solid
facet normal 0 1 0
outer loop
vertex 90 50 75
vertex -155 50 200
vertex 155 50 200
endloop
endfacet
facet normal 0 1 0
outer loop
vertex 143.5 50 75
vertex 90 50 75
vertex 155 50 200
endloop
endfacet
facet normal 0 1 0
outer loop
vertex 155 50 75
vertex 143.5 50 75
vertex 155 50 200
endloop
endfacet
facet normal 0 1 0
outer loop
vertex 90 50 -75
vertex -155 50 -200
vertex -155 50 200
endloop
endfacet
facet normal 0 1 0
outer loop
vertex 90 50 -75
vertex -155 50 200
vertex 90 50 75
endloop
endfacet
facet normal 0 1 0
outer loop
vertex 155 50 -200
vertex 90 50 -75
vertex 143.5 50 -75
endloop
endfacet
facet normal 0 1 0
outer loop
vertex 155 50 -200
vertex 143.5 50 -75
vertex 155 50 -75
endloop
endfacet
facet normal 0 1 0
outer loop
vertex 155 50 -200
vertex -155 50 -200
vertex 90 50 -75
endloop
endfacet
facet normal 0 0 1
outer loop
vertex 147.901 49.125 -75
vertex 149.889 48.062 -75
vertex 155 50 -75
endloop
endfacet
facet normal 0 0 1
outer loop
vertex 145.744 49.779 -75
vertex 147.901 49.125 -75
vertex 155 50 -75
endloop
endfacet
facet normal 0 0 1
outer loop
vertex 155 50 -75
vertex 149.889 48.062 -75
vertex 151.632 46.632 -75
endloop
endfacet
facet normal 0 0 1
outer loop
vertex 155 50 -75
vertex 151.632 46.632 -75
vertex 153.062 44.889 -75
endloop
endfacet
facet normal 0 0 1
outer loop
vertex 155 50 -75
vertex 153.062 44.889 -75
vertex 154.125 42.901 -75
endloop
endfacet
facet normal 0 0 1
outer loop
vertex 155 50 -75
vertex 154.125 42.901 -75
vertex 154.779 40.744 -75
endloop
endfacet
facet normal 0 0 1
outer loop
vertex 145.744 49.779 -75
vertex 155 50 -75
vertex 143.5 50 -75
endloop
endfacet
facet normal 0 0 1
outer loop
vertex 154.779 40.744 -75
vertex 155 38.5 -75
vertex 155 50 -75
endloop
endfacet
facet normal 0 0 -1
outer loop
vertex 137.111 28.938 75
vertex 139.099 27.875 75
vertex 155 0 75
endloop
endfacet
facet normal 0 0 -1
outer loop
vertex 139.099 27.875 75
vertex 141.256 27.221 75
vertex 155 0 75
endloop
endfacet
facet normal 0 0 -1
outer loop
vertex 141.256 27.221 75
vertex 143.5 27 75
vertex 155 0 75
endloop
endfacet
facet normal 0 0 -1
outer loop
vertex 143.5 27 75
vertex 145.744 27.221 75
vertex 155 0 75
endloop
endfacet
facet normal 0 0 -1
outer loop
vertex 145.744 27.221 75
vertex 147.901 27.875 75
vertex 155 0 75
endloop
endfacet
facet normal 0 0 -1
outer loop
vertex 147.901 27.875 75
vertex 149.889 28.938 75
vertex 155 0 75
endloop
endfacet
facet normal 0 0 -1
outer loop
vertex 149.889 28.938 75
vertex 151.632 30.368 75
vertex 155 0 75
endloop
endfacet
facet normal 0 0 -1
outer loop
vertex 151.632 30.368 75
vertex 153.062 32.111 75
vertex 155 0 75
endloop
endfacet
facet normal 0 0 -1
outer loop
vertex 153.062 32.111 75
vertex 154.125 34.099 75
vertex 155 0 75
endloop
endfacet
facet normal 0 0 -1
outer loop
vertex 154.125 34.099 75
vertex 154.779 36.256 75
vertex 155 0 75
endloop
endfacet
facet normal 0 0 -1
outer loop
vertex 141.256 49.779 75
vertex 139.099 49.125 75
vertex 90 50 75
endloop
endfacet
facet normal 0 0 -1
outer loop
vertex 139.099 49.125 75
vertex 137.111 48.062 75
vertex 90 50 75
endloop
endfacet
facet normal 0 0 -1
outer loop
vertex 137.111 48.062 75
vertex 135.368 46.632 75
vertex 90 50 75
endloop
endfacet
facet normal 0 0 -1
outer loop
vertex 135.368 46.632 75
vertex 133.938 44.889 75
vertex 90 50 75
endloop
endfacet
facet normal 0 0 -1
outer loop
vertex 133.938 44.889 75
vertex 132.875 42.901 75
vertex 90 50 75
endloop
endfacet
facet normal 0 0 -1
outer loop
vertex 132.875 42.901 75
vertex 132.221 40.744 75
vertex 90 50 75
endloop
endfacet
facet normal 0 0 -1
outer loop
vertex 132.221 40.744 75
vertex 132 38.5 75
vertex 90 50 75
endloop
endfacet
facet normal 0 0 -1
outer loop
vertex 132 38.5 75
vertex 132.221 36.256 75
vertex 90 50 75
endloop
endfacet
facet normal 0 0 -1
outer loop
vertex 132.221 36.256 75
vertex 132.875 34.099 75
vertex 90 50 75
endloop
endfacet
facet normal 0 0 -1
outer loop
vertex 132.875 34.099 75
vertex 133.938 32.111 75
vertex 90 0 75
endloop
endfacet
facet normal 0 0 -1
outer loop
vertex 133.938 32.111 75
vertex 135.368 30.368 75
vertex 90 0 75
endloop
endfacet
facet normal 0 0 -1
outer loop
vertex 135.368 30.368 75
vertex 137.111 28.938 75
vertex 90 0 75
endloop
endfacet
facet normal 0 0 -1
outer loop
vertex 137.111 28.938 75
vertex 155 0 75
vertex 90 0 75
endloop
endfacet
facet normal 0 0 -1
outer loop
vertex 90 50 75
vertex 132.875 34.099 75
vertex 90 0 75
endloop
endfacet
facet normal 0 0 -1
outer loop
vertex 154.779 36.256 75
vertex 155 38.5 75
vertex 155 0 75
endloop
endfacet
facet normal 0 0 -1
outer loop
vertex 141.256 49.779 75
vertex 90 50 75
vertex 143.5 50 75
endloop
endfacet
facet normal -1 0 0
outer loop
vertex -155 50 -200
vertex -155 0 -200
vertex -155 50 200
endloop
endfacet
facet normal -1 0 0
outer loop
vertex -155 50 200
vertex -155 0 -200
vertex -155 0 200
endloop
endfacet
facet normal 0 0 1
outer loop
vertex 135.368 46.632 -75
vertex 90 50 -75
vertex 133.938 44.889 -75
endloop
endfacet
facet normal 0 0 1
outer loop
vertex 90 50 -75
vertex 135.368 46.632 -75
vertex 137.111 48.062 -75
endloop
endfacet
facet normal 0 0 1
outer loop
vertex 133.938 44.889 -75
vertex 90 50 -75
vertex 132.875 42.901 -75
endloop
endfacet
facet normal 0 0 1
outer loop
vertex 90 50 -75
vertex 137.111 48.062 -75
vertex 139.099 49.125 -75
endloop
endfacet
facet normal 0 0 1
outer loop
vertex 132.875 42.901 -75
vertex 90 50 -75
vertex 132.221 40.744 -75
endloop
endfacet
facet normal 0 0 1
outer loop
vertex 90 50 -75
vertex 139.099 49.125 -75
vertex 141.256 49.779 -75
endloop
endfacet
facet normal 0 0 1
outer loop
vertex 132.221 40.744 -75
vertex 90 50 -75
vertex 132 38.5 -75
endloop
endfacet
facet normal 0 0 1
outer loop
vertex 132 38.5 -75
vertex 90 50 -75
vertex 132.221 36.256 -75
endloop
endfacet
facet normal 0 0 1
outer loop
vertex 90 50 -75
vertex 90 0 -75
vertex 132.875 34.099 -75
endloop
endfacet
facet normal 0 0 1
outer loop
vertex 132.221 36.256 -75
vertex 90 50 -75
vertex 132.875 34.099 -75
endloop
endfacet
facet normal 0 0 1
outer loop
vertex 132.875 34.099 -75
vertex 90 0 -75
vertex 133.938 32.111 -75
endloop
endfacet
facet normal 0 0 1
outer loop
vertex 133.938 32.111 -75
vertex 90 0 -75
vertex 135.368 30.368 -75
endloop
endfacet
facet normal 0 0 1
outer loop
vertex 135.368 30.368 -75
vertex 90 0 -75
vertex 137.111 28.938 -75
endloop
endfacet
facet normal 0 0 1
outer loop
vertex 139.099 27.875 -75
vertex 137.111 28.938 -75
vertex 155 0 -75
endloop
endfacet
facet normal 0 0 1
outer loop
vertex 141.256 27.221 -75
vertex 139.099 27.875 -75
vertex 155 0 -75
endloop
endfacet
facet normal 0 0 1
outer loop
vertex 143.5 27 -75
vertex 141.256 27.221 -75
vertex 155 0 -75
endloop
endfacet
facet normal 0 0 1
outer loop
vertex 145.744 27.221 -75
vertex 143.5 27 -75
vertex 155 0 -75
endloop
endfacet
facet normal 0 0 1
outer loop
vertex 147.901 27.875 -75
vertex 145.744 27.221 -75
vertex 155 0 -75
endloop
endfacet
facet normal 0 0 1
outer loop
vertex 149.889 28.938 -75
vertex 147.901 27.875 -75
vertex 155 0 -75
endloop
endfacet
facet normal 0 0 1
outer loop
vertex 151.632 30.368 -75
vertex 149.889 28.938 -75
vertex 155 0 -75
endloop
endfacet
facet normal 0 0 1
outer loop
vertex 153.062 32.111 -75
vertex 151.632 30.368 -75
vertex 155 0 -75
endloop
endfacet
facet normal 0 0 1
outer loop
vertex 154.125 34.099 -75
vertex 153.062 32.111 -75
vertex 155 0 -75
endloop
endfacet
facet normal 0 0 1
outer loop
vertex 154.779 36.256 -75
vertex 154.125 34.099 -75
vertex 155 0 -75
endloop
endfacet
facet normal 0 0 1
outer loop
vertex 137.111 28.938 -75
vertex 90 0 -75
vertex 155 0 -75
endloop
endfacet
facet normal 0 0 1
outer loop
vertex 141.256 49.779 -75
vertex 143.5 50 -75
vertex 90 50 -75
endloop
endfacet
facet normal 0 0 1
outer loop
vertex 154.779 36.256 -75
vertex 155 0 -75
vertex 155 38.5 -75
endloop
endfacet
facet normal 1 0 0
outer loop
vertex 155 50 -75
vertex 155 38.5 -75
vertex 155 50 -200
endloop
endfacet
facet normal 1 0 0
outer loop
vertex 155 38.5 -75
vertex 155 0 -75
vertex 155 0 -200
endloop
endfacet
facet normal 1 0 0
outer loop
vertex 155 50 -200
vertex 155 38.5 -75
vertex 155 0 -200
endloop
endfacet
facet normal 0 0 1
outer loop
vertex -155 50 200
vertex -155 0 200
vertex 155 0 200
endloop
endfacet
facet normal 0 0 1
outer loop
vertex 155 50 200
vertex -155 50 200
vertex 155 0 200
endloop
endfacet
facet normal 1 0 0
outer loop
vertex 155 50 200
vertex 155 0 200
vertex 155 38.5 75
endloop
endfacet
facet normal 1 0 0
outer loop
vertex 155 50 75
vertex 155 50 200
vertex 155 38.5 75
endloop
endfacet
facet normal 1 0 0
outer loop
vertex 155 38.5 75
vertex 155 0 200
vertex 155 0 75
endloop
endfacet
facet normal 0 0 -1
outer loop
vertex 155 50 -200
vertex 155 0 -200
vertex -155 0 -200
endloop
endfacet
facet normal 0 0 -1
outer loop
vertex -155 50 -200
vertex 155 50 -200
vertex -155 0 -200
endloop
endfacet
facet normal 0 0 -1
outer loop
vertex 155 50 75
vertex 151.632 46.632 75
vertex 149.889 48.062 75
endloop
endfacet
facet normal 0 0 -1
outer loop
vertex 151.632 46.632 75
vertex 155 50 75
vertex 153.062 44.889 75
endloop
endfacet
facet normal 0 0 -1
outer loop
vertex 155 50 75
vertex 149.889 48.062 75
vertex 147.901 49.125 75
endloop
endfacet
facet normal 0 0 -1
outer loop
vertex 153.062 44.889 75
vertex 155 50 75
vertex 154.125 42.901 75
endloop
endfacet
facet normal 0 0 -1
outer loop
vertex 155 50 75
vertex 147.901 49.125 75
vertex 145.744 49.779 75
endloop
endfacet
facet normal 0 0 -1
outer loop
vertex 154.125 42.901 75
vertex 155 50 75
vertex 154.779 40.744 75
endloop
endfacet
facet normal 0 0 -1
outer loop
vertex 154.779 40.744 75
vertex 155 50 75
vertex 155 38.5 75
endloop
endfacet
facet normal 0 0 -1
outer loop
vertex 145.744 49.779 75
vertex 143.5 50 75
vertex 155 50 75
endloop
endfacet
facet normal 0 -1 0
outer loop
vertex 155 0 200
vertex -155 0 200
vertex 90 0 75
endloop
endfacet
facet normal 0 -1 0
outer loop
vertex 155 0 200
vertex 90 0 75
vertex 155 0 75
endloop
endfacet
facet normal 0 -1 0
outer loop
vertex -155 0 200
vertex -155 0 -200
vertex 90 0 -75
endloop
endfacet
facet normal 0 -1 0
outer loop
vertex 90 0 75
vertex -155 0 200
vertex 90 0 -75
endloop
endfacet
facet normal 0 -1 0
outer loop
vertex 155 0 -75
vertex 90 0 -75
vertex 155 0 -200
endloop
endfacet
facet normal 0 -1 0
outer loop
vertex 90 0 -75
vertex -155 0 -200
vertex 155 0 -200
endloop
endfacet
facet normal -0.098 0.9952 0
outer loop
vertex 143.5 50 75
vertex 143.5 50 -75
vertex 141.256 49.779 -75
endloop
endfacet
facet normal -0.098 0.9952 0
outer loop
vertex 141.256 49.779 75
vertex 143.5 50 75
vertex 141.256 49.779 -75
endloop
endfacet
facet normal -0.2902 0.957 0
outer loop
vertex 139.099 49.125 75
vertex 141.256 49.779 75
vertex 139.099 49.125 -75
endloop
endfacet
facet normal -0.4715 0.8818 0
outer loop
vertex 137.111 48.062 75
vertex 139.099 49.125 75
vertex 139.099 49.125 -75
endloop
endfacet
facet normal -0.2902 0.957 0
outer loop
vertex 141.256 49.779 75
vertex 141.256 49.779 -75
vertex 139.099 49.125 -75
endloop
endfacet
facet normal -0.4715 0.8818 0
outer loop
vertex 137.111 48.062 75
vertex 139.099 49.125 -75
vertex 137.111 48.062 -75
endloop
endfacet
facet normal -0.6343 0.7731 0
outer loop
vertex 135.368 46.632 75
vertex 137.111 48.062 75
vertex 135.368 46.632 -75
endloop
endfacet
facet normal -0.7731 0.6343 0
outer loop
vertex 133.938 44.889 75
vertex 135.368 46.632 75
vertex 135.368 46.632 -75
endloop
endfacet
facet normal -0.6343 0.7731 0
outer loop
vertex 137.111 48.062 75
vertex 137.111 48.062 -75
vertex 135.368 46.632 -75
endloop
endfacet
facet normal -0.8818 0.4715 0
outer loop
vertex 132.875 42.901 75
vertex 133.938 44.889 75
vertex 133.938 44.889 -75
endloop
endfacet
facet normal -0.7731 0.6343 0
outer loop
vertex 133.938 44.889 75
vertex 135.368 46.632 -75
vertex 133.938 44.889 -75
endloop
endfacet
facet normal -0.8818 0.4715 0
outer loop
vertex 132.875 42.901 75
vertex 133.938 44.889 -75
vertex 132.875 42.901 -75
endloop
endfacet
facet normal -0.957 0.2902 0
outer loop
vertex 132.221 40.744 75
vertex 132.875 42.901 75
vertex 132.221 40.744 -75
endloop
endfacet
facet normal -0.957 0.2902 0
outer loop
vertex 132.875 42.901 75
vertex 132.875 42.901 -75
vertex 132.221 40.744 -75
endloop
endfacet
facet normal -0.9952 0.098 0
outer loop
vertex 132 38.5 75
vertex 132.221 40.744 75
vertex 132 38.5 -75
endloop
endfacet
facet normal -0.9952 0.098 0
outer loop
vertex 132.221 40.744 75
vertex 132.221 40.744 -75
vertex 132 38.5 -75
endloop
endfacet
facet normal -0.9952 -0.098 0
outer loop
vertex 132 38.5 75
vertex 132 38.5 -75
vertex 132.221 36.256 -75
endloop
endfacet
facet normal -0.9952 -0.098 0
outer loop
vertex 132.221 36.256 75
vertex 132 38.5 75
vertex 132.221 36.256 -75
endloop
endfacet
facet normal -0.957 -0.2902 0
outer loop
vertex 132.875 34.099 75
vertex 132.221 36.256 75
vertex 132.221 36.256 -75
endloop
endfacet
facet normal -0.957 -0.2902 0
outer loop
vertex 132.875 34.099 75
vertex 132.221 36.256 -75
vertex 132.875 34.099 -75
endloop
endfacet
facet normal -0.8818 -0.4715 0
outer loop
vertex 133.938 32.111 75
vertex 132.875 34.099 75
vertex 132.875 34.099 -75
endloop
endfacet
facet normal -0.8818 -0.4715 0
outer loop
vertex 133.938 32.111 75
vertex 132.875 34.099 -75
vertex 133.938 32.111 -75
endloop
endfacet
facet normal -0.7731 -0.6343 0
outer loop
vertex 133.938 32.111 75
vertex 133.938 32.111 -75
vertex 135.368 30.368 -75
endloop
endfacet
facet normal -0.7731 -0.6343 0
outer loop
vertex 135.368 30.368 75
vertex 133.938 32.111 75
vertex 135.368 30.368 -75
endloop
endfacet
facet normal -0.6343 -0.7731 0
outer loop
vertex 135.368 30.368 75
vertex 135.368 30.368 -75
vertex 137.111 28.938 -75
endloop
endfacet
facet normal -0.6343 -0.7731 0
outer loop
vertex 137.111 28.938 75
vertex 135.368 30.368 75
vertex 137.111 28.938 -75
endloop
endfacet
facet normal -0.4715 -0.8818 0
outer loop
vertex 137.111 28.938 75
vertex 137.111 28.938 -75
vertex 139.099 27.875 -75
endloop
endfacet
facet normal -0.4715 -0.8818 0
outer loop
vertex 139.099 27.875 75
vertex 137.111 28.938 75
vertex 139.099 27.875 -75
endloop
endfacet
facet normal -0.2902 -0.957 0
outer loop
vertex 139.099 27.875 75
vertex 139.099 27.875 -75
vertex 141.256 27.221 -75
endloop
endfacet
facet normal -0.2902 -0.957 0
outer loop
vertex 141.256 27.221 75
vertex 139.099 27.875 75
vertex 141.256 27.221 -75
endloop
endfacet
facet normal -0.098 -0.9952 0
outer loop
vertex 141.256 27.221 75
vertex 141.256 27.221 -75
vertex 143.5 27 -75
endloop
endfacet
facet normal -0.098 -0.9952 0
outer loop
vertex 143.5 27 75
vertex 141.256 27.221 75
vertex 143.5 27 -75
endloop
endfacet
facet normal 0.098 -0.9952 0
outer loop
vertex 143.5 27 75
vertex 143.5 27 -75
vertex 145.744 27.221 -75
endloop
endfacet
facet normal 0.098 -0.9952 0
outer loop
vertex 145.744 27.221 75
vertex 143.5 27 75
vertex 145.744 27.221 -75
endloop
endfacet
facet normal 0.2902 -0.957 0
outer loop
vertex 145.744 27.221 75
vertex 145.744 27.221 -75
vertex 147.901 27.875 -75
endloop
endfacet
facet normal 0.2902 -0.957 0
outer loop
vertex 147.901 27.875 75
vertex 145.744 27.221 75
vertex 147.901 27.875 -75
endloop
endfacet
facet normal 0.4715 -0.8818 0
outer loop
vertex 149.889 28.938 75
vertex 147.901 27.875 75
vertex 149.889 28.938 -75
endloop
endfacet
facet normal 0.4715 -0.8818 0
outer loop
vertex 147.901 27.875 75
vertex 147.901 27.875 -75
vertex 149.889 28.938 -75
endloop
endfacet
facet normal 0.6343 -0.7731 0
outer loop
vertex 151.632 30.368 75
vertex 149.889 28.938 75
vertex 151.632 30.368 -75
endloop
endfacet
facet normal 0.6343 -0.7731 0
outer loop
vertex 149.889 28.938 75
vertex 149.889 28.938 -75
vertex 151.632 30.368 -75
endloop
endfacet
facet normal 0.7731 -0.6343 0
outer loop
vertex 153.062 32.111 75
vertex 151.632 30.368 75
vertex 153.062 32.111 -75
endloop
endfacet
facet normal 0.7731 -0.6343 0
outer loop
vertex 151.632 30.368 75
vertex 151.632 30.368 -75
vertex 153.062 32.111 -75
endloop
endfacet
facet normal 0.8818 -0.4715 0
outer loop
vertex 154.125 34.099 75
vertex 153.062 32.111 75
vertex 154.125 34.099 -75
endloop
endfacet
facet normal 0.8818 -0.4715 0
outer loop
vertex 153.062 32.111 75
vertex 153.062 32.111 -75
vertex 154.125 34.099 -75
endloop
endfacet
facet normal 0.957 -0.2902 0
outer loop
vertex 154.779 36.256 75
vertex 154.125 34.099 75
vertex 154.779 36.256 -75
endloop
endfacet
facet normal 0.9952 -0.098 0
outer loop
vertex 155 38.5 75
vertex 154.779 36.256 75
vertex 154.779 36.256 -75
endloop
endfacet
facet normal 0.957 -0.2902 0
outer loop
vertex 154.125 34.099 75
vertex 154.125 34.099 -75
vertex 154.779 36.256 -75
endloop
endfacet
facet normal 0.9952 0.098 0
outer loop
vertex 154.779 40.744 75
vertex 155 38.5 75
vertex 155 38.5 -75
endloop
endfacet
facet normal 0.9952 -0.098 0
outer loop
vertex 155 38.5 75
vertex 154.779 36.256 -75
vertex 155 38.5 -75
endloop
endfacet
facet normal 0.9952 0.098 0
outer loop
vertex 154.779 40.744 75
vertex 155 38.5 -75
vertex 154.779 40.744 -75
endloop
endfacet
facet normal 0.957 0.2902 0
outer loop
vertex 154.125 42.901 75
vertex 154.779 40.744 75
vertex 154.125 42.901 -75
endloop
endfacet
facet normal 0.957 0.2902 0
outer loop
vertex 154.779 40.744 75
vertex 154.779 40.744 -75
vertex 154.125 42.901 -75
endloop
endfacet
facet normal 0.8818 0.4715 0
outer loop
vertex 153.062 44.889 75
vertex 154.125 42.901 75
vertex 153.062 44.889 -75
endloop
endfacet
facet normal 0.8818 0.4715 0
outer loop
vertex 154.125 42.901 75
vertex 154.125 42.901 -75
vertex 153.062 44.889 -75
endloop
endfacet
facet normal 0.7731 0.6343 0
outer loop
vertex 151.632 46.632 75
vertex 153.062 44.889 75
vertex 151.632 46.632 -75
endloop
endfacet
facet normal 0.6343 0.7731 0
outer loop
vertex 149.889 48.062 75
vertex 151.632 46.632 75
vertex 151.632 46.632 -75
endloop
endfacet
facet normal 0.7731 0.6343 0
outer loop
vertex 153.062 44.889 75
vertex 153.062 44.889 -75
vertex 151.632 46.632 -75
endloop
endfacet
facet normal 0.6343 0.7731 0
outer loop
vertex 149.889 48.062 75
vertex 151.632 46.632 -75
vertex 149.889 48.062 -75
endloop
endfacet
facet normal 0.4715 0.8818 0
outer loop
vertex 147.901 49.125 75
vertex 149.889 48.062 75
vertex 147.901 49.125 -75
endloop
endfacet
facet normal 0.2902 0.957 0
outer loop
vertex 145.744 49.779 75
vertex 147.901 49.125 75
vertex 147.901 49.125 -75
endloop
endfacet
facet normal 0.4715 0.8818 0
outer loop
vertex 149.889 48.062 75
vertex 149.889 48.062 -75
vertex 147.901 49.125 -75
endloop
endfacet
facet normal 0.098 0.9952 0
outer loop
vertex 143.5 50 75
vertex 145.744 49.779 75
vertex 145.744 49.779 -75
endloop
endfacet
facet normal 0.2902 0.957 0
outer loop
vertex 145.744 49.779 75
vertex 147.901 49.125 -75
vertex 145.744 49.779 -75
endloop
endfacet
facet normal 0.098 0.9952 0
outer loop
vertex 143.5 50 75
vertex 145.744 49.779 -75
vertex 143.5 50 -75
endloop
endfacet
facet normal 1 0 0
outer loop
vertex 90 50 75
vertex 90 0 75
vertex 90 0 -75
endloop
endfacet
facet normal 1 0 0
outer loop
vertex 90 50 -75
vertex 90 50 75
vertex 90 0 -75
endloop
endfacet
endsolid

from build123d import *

# Parameters (mm, degrees)
BOSS_EXTRUDE1_DEPTH = 50
SKETCH2_R           = 11.5
BOSS_EXTRUDE2_DEPTH = 150


with BuildPart() as part:
    # Sketch1 → Boss-Extrude1 (new body)
    with BuildSketch(Plane(origin=(0, 0, 0), x_dir=(1, 0, 0), z_dir=(0, 1, 0))):
        Polygon((155, -200), (155, -75), (90, -75), (90, 75), (155, 75), (155, 200), (-155, 200), (-155, -200), align=None)
    extrude(amount=BOSS_EXTRUDE1_DEPTH)

    # Sketch2 → Boss-Extrude2 (add)
    with BuildSketch(Plane.XY.offset(-75)):
        with Locations(Location((143.5, 38.5, 0), (0, 0, 90))):
            Circle(SKETCH2_R)
    extrude(amount=BOSS_EXTRUDE2_DEPTH)


solid = part.part
